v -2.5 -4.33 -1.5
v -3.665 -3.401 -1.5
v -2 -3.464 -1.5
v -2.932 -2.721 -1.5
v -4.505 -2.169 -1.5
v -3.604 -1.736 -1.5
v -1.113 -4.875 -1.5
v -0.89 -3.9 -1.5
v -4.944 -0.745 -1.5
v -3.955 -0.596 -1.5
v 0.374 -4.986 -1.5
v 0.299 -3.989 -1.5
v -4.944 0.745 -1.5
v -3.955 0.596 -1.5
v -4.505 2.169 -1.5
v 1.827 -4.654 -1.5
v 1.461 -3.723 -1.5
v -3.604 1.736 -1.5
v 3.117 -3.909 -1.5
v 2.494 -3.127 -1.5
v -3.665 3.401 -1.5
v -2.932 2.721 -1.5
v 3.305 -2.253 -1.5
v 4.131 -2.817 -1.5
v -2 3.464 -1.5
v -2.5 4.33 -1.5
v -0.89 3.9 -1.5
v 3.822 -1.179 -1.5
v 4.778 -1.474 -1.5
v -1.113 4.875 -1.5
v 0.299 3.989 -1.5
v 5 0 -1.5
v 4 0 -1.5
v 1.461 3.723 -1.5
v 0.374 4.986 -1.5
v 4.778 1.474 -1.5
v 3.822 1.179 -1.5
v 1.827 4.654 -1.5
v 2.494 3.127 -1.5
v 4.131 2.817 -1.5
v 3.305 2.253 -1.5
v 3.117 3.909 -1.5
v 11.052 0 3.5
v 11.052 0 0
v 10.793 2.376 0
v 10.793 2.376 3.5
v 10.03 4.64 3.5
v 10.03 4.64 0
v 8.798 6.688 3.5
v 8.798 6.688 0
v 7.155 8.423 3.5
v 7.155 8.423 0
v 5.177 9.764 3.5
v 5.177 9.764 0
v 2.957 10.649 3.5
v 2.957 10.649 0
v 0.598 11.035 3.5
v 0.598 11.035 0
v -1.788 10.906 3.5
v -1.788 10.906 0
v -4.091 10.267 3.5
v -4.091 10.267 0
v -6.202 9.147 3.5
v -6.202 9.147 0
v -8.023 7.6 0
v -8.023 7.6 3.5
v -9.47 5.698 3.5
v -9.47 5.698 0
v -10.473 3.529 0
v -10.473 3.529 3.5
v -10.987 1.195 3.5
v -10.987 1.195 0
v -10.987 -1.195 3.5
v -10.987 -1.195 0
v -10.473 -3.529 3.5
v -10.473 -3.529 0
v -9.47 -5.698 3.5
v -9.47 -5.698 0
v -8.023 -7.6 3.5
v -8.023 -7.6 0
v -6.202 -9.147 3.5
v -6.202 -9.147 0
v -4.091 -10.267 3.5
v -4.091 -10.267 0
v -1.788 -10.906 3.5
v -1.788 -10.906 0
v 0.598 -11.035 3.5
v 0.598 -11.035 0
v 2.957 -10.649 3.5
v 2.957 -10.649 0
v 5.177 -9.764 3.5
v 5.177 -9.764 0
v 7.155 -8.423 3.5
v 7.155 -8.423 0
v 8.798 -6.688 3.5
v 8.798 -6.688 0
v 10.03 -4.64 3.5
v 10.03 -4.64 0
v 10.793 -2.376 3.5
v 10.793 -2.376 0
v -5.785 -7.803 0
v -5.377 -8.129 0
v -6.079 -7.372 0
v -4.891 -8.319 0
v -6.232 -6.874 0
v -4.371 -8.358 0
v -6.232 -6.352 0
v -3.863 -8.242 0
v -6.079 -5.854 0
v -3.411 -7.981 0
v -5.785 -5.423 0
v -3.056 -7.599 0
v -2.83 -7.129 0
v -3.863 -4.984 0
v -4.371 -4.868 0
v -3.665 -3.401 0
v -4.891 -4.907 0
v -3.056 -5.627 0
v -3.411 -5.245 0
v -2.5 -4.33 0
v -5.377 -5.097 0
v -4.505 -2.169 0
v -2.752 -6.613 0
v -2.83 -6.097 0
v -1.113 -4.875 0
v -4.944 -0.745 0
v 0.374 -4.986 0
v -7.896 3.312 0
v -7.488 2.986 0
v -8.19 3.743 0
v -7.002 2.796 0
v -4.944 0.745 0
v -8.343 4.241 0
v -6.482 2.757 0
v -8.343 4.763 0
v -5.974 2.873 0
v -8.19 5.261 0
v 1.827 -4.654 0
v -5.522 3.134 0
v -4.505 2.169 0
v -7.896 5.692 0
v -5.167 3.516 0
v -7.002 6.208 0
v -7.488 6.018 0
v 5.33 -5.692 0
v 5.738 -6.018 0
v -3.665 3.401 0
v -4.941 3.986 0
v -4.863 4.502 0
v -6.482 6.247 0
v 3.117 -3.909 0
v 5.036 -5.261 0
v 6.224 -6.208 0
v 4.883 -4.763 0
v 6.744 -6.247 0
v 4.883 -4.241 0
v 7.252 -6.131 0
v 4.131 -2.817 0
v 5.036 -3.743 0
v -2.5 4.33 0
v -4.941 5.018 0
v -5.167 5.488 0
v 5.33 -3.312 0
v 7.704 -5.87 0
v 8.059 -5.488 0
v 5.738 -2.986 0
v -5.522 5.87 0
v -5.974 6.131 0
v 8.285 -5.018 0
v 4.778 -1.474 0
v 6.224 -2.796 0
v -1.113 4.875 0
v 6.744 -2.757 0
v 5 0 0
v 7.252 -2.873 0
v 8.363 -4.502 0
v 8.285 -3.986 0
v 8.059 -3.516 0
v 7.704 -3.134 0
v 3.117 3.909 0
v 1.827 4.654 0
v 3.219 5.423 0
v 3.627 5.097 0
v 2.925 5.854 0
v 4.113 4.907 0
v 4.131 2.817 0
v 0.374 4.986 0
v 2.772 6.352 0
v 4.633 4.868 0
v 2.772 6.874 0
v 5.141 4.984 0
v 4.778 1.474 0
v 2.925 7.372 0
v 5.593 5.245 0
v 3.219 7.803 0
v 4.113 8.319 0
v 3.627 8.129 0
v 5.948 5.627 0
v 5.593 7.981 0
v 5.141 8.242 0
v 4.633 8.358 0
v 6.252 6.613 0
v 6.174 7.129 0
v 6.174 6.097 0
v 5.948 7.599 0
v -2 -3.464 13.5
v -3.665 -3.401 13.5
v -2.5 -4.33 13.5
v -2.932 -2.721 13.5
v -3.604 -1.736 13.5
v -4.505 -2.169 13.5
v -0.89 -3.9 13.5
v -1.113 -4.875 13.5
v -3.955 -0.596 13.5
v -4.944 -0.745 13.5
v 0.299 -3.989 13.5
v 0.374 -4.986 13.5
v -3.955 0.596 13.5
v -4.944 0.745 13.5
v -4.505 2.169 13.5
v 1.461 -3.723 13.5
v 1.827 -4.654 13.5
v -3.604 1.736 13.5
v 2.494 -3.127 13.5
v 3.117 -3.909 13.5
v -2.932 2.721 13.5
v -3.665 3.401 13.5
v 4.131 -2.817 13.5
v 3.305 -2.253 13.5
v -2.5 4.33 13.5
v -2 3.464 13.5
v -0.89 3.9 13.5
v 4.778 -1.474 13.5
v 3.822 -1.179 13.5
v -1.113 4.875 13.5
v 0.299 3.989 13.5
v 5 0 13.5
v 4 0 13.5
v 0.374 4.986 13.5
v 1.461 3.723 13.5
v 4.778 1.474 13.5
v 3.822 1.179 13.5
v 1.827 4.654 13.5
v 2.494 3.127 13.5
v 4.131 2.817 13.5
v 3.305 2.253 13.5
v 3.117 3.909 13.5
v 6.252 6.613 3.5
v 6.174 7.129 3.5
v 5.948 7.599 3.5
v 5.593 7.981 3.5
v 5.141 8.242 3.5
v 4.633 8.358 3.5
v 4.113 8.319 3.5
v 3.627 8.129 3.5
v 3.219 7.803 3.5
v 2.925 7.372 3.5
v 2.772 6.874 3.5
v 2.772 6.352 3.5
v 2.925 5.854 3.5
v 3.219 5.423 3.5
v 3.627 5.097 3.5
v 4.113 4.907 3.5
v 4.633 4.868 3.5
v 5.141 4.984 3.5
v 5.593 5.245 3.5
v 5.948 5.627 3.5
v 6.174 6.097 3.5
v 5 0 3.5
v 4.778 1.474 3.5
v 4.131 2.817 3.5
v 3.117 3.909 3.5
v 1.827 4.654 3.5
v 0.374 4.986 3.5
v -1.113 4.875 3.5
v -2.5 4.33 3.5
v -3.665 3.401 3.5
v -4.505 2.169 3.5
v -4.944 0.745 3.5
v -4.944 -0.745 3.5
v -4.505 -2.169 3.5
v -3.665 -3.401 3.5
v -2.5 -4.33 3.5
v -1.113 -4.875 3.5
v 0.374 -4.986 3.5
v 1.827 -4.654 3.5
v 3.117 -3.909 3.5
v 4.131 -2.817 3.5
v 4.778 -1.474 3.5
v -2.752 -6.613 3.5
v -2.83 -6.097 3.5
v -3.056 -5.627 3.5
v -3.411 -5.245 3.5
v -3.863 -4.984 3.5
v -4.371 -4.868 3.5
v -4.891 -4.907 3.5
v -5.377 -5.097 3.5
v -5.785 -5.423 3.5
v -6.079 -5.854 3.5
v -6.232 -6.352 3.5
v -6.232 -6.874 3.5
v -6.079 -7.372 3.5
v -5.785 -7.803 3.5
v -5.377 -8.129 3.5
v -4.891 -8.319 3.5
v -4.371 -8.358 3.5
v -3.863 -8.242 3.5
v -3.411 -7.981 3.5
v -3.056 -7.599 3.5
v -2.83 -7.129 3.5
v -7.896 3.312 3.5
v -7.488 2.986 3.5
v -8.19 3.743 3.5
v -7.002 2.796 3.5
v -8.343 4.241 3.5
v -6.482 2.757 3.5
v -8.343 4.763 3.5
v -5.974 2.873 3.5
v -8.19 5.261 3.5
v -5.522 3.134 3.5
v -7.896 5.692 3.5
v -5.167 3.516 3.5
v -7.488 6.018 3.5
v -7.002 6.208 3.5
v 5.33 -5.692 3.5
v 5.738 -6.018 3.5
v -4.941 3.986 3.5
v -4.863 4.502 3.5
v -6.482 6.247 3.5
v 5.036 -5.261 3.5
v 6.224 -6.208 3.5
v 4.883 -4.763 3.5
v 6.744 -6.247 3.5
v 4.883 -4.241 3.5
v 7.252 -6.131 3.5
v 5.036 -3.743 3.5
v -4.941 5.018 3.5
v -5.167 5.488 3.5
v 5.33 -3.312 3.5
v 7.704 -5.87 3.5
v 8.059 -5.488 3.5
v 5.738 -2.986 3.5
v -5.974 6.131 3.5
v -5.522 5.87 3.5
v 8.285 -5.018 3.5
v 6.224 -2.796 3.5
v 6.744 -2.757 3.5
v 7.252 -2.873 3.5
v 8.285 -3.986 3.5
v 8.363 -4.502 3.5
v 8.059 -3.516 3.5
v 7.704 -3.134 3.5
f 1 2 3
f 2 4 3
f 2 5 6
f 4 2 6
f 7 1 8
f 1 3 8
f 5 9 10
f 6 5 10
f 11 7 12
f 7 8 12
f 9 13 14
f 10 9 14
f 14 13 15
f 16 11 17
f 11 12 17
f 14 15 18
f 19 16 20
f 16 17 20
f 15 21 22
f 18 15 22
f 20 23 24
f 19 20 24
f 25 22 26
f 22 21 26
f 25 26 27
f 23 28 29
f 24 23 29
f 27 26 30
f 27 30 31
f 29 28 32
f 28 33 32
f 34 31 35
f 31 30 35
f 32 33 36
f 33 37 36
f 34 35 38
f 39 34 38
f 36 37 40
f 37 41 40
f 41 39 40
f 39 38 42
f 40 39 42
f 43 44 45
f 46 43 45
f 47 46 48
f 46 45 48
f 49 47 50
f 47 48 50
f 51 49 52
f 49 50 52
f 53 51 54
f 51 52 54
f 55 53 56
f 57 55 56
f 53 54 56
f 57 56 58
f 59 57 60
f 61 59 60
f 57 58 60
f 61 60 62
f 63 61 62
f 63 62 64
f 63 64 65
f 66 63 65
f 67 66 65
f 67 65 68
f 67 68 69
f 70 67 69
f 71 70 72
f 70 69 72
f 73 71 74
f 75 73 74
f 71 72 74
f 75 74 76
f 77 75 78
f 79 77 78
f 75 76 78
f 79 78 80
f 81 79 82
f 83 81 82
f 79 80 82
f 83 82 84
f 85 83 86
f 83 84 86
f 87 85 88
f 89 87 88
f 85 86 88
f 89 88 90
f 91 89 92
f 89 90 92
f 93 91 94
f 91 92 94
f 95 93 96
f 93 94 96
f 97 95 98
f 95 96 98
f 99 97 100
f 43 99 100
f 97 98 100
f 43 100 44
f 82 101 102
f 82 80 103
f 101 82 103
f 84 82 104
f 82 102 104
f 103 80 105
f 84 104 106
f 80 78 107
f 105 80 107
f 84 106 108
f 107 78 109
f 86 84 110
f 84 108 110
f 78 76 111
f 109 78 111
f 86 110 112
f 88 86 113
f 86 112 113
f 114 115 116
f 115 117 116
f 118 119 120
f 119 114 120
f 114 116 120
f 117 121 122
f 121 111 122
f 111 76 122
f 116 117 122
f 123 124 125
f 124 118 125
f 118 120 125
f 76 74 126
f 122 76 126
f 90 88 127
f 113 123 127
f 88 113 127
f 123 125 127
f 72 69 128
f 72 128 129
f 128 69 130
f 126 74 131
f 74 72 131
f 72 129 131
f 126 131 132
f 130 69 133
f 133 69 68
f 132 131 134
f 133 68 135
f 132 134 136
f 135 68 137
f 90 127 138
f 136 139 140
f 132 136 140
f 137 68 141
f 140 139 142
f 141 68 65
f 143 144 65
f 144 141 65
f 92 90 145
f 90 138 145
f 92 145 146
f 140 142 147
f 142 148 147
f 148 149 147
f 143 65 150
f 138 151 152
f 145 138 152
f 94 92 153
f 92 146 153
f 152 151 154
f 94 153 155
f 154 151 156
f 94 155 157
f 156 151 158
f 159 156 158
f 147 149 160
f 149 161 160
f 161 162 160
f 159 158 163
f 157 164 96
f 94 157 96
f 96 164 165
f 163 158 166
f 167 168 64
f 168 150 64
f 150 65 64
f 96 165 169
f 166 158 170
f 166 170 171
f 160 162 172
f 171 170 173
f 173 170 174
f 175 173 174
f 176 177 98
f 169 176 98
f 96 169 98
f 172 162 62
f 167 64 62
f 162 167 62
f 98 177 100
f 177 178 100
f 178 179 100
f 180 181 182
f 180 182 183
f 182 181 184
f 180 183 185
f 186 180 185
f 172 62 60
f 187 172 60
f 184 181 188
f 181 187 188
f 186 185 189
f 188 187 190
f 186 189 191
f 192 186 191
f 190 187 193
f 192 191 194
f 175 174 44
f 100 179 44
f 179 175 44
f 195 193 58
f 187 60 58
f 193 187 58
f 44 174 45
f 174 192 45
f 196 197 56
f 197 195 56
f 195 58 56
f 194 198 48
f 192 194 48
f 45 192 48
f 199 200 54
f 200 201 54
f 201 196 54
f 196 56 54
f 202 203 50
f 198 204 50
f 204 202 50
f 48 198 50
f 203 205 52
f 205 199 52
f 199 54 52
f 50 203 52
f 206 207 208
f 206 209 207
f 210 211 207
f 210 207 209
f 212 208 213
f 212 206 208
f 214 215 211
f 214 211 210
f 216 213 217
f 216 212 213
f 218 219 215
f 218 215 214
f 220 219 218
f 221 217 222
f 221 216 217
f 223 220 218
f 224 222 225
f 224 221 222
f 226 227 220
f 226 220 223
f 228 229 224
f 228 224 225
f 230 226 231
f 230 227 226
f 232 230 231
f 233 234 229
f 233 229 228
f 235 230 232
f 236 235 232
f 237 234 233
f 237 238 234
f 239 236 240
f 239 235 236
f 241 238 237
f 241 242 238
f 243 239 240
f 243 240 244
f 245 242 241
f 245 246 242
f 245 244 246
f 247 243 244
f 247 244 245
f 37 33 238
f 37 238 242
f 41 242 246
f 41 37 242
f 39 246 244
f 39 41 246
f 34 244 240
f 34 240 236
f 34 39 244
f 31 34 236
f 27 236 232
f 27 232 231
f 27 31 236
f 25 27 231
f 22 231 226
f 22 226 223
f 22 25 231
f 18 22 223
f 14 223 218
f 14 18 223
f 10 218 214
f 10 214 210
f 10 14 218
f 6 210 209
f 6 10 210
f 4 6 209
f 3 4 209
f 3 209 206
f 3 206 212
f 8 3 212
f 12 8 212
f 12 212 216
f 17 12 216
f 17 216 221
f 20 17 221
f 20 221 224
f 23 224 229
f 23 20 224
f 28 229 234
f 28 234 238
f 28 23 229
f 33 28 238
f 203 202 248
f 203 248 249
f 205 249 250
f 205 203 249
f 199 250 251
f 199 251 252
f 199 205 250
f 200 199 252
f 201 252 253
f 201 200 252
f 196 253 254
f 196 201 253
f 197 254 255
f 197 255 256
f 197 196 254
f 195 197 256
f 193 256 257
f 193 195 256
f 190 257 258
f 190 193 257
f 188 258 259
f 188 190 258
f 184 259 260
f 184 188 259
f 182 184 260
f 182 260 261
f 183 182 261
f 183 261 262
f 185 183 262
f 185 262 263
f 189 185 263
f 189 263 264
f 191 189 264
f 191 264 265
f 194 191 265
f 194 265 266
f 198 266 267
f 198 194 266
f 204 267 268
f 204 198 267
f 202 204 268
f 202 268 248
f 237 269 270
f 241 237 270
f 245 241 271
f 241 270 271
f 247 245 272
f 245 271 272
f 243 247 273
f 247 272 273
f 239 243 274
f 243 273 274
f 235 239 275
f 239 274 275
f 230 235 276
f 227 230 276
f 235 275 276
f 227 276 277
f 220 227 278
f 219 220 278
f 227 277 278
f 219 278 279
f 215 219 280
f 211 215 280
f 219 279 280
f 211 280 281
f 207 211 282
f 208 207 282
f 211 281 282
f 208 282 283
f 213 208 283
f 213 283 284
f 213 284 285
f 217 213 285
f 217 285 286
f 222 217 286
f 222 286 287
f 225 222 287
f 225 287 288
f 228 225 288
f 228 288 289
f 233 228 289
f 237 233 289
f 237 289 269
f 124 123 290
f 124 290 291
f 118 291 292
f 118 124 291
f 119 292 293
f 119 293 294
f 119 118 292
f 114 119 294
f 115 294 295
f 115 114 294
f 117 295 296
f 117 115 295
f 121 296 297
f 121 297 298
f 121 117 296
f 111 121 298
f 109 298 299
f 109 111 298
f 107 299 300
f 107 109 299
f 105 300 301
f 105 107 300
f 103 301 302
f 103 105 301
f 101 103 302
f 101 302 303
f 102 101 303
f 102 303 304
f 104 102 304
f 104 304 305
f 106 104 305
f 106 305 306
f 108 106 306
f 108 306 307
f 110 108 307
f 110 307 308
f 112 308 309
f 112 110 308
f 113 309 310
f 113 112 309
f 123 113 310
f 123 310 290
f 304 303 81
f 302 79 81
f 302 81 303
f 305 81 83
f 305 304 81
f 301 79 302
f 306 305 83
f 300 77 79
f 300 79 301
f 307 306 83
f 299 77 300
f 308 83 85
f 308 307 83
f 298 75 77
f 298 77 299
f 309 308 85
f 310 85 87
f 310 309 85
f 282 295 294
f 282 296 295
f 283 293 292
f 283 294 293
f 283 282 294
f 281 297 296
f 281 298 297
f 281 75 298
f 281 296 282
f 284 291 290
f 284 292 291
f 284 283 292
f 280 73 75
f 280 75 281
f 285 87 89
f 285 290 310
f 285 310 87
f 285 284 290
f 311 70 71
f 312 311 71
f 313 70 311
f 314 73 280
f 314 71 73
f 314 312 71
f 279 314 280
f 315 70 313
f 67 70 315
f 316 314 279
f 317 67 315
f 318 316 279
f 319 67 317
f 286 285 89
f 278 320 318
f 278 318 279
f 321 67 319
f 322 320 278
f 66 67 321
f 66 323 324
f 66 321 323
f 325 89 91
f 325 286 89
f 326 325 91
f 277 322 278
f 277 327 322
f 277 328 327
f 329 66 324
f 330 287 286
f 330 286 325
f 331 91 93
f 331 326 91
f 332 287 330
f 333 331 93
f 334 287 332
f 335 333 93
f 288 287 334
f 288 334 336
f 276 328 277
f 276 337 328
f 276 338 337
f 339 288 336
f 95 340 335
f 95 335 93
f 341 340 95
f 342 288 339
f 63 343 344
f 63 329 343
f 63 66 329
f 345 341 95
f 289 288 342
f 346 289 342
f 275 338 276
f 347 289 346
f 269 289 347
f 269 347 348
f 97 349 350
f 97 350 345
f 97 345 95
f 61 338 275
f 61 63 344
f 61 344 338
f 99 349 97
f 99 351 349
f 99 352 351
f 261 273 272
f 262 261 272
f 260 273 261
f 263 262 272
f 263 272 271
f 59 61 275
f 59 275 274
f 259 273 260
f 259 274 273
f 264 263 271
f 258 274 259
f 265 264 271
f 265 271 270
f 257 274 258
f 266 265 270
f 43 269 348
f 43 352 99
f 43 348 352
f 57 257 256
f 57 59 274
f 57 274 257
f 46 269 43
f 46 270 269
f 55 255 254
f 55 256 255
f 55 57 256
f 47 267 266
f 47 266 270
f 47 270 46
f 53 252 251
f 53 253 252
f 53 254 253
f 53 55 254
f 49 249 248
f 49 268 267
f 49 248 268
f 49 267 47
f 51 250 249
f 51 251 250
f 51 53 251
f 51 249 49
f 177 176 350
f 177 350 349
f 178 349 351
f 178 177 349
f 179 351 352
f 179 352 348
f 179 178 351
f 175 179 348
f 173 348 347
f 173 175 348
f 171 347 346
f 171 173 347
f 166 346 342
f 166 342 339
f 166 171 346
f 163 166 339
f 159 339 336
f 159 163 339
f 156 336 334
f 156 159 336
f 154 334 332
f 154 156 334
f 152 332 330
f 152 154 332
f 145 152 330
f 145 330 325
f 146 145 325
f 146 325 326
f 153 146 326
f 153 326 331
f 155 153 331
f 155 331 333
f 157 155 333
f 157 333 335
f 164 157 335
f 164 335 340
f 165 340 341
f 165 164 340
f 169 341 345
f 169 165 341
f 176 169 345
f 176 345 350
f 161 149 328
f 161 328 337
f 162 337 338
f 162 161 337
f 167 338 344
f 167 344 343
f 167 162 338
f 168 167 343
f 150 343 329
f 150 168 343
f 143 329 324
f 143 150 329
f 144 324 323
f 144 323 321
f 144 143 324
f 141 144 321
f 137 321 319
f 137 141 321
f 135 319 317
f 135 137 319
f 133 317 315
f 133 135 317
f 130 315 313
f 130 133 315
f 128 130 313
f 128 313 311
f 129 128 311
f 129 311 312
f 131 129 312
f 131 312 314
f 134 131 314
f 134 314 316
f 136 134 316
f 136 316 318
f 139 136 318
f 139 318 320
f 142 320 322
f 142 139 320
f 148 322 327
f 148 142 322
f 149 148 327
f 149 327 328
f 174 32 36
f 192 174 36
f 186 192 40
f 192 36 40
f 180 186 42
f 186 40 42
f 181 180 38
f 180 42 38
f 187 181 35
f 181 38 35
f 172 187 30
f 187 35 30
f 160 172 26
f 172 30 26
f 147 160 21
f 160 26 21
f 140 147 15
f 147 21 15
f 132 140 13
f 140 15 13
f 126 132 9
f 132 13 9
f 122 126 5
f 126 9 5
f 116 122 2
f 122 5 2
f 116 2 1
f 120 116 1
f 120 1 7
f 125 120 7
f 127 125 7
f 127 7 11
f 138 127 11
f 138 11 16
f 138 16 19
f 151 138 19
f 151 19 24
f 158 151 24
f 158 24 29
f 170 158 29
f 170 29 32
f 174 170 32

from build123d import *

# Parameters (mm, degrees)
SKETCH_1_R           = 11.051525353
SKETCH_1_R_2         = 1.75
SKETCH_1_R_3         = 5
EXTRUDE_2_DEPTH      = 3.5
EXTRUDE_3_DEPTH      = 13.5
EXTRUDE_3_DEPTH_BACK = 1.5
SKETCH_1_5_R         = 5
SKETCH_1_5_R_2       = 4


with BuildPart() as part:
    # 草图1 → 凸台-拉伸2 (new body)
    with BuildSketch(Plane.XY):
        Circle(SKETCH_1_R)
        with Locations((-4.502000398, -6.613016892)):
            Circle(SKETCH_1_R_2, mode=Mode.SUBTRACT)
        Circle(SKETCH_1_R_3, mode=Mode.SUBTRACT)
        with Locations((6.613016892, -4.502000398)):
            Circle(SKETCH_1_R_2, mode=Mode.SUBTRACT)
        with Locations((-6.613016892, 4.502000398)):
            Circle(SKETCH_1_R_2, mode=Mode.SUBTRACT)
        with Locations((4.502000398, 6.613016892)):
            Circle(SKETCH_1_R_2, mode=Mode.SUBTRACT)
    extrude(amount=EXTRUDE_2_DEPTH)

    # 草图1<5> → 凸台-拉伸3 (add, two sides: drawn at the far end of the back side and taken through both)
    with BuildSketch(Plane.XY.offset(-EXTRUDE_3_DEPTH_BACK)):
        Circle(SKETCH_1_5_R)
        Circle(SKETCH_1_5_R_2, mode=Mode.SUBTRACT)
    extrude(amount=EXTRUDE_3_DEPTH + EXTRUDE_3_DEPTH_BACK)


solid = part.part
